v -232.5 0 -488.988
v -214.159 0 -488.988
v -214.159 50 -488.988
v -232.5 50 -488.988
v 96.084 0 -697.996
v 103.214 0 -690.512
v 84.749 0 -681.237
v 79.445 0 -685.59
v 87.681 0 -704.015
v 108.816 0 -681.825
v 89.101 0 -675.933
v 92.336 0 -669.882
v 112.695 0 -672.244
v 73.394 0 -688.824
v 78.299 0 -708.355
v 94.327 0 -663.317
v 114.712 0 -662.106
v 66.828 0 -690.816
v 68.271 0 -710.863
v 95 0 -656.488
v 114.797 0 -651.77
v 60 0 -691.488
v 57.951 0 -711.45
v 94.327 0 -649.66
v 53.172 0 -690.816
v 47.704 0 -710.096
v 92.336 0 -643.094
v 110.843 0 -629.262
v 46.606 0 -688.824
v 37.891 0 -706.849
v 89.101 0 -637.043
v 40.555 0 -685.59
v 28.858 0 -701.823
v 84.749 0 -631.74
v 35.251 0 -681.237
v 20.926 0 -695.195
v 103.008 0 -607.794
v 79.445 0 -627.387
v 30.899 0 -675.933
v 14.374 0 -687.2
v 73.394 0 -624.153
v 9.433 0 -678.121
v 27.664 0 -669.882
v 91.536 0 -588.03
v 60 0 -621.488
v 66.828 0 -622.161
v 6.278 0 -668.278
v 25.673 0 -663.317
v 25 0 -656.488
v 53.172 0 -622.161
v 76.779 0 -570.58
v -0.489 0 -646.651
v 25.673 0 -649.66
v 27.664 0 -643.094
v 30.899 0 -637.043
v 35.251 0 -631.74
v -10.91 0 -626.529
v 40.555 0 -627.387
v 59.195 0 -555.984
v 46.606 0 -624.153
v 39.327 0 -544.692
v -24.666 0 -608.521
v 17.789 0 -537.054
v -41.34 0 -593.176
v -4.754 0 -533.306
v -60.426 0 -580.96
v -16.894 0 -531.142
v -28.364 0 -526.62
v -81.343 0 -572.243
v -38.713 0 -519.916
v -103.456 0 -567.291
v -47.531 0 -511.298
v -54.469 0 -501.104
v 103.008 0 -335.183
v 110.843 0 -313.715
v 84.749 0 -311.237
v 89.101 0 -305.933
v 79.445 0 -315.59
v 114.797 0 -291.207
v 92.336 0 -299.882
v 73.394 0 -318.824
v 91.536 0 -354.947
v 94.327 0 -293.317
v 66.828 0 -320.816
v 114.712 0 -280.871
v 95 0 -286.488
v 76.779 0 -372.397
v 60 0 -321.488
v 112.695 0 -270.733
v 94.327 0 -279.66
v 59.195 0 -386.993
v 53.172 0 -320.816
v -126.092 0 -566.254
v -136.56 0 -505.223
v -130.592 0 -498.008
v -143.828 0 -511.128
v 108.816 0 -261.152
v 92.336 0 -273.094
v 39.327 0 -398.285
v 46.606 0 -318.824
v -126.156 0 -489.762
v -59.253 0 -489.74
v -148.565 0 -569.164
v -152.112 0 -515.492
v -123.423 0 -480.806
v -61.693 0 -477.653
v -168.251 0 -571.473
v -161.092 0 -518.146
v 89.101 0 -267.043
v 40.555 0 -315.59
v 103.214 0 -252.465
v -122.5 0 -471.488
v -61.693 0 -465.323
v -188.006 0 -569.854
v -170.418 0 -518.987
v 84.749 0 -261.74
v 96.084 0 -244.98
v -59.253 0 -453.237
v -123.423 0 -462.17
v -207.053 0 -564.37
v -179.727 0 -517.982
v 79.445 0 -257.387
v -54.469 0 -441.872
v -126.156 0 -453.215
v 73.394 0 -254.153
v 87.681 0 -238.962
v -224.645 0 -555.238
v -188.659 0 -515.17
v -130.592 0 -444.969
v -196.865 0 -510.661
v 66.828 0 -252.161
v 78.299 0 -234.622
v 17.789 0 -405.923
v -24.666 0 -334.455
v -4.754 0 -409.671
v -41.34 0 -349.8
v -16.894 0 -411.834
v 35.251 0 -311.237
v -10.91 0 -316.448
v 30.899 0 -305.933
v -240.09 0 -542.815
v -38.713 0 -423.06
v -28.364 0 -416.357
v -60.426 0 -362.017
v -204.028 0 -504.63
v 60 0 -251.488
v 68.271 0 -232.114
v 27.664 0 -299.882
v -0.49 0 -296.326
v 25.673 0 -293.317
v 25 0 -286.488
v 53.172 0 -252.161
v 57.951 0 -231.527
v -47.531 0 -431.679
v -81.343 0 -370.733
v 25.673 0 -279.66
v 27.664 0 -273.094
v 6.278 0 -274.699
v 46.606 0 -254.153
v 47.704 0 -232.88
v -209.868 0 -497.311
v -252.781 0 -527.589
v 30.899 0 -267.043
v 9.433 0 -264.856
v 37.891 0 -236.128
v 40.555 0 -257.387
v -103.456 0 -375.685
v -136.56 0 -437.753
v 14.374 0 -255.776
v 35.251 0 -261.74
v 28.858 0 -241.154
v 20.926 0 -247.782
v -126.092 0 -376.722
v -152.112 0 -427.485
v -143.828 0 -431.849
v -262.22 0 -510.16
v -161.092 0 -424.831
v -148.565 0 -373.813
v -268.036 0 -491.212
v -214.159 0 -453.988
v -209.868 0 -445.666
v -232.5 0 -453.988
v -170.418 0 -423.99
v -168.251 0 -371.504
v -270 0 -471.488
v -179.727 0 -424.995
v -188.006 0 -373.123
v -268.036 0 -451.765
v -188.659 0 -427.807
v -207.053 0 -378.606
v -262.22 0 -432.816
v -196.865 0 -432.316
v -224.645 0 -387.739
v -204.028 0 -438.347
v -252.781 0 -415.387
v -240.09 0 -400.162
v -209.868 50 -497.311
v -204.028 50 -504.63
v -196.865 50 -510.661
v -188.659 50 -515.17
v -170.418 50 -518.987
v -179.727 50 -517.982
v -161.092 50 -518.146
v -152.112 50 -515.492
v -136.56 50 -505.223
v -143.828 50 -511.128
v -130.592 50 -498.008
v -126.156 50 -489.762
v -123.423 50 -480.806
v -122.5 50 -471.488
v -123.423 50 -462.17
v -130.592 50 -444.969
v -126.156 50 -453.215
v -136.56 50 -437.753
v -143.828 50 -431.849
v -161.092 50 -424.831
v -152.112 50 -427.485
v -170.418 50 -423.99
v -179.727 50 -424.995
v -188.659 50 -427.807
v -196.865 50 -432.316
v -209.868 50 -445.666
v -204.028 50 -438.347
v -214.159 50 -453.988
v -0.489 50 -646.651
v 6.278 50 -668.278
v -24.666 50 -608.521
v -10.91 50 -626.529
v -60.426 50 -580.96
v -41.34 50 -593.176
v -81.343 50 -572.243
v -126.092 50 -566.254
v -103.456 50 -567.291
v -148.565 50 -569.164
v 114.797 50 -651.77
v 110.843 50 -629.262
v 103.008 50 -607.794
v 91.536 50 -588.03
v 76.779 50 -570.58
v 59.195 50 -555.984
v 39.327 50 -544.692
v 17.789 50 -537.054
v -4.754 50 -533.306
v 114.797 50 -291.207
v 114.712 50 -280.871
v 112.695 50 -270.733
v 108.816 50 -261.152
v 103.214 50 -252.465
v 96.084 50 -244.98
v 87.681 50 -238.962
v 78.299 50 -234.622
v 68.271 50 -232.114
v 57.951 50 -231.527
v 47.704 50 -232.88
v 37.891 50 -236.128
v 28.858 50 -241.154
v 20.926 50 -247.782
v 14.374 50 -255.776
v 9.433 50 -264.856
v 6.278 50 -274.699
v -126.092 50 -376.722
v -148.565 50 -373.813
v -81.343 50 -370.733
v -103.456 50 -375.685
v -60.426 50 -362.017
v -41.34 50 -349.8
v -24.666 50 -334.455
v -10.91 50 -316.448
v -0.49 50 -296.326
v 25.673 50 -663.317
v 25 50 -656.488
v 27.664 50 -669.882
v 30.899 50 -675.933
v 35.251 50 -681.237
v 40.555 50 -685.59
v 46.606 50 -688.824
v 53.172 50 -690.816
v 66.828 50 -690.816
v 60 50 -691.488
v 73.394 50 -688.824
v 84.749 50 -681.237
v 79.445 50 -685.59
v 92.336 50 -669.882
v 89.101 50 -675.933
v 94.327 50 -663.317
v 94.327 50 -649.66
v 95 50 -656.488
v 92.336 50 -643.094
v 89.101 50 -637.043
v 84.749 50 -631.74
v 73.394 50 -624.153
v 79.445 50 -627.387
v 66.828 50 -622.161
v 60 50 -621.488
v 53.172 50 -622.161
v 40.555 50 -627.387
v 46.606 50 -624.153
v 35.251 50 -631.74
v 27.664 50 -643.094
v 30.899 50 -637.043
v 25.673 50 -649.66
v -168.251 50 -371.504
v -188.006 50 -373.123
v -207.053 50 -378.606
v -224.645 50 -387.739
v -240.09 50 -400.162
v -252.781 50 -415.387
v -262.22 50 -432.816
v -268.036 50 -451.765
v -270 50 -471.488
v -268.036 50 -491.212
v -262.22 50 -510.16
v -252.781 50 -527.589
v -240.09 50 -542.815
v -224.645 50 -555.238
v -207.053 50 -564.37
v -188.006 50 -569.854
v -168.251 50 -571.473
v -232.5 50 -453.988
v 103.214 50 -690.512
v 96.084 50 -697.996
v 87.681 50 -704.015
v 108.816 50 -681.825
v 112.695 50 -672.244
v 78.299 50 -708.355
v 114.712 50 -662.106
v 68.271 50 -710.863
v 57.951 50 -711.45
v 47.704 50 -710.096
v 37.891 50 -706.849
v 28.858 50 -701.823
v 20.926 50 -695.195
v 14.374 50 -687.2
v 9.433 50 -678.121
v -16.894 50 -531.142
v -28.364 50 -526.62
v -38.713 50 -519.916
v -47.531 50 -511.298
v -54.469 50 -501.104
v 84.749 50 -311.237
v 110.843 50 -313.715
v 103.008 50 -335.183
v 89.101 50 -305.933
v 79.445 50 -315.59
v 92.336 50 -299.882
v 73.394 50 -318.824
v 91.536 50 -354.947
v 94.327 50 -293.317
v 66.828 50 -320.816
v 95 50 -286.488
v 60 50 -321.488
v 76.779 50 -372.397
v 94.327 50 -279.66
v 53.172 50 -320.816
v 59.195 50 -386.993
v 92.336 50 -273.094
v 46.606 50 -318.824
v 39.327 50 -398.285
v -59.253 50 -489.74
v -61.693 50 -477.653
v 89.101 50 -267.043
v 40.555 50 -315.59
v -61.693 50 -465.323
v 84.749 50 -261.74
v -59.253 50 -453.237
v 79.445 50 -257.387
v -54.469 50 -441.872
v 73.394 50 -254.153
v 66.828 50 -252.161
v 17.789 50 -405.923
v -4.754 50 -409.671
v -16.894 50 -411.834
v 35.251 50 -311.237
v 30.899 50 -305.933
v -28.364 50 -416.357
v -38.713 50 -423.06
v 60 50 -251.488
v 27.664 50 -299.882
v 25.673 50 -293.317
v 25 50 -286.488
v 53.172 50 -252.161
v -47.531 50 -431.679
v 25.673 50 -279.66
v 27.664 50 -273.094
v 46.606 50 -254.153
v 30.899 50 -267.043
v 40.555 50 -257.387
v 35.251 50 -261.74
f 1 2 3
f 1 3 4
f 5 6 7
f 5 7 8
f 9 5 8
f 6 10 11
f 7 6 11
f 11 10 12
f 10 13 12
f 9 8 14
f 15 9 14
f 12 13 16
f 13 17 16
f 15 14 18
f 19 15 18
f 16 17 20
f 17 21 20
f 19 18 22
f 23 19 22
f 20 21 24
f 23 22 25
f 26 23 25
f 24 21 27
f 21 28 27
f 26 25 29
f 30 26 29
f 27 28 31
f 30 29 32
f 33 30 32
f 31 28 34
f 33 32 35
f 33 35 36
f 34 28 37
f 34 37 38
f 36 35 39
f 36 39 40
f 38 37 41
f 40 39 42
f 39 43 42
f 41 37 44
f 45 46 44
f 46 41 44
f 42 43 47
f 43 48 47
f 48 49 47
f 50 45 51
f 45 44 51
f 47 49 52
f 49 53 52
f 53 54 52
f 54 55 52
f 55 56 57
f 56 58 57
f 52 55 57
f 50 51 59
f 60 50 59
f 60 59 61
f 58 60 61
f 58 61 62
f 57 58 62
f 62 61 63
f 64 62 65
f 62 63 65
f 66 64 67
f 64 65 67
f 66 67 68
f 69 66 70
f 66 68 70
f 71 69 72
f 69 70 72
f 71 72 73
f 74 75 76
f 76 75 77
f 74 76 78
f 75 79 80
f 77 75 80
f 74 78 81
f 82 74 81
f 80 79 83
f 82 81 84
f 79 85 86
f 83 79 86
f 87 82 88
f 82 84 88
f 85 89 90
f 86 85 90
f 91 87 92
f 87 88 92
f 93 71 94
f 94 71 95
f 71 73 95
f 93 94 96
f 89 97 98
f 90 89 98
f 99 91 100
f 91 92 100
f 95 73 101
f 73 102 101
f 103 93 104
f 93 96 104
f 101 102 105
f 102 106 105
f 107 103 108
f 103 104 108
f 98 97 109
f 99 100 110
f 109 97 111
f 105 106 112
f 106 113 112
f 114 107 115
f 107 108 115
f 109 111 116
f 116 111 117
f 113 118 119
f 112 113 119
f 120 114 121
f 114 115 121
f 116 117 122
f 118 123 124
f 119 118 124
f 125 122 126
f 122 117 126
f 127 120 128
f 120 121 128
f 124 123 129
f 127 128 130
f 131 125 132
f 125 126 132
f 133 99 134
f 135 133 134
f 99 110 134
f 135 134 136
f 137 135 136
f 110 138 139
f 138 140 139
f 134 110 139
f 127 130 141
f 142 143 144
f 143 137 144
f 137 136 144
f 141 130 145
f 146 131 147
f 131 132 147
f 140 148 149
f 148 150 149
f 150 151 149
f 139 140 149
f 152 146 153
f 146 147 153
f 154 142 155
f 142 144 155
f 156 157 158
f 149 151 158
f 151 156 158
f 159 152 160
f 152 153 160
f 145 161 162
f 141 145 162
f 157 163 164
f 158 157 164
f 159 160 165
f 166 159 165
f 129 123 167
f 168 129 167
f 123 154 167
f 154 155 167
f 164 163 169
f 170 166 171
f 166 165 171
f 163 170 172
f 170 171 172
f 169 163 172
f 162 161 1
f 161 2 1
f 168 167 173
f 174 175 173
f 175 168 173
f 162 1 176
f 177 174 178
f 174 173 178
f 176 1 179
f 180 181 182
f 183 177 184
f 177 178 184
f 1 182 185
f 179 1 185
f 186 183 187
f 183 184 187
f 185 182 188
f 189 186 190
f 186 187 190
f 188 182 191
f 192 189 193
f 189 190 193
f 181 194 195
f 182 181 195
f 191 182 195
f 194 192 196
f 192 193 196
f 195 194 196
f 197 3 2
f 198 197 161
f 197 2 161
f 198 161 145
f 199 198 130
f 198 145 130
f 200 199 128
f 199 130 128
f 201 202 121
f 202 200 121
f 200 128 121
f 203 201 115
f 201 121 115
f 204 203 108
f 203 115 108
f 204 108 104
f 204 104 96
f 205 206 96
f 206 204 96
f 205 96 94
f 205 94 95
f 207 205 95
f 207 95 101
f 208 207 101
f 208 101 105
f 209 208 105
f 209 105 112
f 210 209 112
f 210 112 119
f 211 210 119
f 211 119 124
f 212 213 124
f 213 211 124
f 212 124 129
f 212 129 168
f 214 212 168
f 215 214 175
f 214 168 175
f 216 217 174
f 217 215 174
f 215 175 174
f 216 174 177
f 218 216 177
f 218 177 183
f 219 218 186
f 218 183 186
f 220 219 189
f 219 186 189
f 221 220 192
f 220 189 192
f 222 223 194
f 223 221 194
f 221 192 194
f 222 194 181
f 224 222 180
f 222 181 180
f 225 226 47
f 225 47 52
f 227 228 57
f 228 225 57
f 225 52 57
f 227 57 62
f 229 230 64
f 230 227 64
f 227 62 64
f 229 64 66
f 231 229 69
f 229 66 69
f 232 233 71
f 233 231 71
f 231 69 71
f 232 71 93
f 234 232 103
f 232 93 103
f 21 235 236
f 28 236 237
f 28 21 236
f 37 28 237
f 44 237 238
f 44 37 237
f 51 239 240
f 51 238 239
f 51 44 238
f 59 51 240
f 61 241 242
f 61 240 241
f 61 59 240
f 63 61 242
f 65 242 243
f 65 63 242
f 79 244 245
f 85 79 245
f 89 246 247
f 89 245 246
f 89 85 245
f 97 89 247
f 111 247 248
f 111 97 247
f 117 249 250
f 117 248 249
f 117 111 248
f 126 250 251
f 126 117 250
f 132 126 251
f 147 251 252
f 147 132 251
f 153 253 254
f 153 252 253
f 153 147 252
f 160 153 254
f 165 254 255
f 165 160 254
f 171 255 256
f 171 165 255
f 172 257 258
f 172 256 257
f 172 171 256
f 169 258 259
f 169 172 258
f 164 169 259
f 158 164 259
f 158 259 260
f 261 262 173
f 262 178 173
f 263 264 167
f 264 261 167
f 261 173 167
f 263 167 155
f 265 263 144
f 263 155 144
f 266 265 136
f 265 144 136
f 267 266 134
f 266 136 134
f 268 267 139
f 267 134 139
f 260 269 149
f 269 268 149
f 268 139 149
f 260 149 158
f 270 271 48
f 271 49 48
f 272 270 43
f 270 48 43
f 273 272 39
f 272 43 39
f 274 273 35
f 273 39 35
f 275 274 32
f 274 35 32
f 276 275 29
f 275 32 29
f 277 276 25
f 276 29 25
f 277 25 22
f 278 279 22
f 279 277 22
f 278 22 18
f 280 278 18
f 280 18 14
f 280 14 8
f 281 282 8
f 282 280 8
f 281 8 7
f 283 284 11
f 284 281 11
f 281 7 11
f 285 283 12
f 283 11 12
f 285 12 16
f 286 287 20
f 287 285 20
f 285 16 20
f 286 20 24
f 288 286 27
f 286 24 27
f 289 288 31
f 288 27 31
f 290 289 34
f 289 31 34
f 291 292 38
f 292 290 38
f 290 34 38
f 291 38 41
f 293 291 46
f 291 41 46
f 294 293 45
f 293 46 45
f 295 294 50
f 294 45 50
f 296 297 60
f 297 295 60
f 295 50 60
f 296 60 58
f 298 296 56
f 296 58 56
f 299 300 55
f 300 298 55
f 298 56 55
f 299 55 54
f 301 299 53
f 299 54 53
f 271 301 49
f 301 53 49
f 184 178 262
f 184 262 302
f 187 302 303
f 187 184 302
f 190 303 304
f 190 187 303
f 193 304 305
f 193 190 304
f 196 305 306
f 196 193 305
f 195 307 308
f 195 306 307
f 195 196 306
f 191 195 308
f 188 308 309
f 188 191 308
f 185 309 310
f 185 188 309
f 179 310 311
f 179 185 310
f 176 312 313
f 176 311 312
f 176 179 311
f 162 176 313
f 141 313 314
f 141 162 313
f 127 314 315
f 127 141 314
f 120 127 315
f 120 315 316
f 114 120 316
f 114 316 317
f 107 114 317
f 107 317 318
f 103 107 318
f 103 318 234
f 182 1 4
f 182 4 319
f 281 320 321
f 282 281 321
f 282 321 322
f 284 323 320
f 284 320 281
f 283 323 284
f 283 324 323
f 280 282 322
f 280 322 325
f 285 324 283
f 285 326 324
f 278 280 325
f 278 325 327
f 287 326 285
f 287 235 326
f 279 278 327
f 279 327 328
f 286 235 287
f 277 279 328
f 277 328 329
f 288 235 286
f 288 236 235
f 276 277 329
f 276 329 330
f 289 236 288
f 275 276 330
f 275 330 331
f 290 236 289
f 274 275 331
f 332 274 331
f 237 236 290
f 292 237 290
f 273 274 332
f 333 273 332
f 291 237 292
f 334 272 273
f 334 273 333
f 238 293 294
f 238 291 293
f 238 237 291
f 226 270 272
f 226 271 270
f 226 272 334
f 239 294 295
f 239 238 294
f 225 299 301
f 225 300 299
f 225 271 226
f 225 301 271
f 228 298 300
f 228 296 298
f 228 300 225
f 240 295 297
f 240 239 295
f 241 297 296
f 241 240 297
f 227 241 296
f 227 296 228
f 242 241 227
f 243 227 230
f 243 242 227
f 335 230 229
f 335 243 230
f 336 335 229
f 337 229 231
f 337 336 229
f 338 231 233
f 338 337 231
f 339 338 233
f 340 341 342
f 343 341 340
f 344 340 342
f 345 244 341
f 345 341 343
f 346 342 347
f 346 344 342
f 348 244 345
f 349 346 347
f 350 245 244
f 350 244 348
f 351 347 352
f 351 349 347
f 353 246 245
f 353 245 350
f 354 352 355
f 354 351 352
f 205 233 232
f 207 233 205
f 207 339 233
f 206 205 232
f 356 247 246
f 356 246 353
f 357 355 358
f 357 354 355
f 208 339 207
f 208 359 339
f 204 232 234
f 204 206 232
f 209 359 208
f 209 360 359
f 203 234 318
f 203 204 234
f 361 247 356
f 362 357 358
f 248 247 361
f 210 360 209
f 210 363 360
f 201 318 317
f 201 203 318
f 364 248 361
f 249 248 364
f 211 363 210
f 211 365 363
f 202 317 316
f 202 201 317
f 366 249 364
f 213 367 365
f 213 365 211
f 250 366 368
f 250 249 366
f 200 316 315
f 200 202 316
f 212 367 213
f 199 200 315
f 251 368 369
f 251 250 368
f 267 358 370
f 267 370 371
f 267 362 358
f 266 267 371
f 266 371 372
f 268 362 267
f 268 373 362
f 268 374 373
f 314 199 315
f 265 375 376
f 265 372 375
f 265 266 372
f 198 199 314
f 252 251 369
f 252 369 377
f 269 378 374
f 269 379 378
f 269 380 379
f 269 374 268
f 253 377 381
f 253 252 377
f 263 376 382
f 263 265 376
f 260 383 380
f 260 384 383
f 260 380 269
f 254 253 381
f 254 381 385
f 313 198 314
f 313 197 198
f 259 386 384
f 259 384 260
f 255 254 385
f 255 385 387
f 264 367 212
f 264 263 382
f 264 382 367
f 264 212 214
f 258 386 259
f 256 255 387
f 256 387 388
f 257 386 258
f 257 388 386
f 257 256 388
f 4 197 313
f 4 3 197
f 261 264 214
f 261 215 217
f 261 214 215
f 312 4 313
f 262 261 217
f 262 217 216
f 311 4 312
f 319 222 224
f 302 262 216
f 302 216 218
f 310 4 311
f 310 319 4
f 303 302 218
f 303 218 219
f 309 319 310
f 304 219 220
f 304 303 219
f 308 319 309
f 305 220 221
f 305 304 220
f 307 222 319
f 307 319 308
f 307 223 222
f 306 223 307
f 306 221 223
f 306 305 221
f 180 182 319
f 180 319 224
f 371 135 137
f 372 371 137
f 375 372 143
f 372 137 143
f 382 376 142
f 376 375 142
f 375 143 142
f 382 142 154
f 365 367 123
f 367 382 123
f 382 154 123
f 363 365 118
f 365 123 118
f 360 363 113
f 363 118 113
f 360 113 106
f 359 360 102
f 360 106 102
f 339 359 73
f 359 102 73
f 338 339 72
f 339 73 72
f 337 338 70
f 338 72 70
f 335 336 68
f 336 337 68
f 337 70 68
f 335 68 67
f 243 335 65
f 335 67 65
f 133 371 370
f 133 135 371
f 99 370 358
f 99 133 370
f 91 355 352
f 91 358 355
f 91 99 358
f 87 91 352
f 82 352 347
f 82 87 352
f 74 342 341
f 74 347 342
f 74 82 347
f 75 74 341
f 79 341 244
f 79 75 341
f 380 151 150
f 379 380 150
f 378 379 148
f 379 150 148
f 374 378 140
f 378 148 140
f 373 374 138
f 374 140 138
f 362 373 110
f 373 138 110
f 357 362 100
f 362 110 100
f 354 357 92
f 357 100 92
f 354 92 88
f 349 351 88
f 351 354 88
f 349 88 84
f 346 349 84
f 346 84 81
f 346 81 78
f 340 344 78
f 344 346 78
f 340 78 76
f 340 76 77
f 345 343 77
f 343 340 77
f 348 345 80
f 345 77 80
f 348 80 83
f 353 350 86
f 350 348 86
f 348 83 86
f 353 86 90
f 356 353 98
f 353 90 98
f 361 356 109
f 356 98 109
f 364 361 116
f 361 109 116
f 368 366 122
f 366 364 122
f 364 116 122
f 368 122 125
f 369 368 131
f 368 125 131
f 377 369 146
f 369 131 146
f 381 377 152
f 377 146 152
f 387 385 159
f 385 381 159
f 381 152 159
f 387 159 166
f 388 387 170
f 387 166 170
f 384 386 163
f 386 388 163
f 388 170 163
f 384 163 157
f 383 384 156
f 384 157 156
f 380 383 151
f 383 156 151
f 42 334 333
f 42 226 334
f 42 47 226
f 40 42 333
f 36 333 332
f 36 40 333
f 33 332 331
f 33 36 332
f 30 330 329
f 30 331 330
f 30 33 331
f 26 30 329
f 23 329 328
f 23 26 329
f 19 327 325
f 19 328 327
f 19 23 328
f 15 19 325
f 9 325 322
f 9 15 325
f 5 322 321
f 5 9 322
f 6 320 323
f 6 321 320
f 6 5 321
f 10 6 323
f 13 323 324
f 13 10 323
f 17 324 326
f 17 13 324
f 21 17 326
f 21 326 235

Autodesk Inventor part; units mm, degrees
ref_plane "YZ Plane" through (0, 0, 0) normal (1, 0, 0) x (0, 1, 0)
ref_plane "XZ Plane" through (0, 0, 0) normal (0, 1, 0) x (-1, 0, 0)
ref_plane "XY Plane" through (0, 0, 0) normal (0, 0, 1) x (1, 0, 0)
sketch "Sketch1" plane through (0, 0, 0) normal (0, 1, 0) x (-1, 0, 0)
  arc A0 (148.5653, -569.1641) -> (148.5653, -373.8126) centre (170, -471.4884) ccw
  arc A1 (4.7545, -533.3058) -> (4.7545, -409.6709) centre (0, -471.4884) ccw
  arc A2 (-6.2783, -274.6993) -> (-114.7972, -291.2071) centre (-60, -286.4884) ccw
  arc A3 (-114.7972, -651.7696) -> (-6.2783, -668.2775) centre (-60, -656.4884) ccw
  arc A4 (-6.2783, -274.6993) -> (148.5653, -373.8126) centre (120.7001, -246.8341) ccw
  arc A5 (148.5653, -569.1641) -> (-6.2783, -668.2775) centre (120.7001, -696.1426) ccw
  arc A6 (-114.7972, -291.2071) -> (4.7545, -409.6709) centre (14.7235, -280.0537) ccw
  arc A7 (4.7545, -533.3058) -> (-114.7972, -651.7696) centre (14.7235, -662.923) ccw
  circle A8 centre (-60, -286.4884) radius 35
  arc A9 (214.1588, -453.9884) -> (214.1588, -488.9884) centre (170, -471.4884) ccw
  circle A10 centre (-60, -656.4884) radius 35
  line L0 (232.5, -453.9884) -> (214.1588, -453.9884)
  line L1 (214.1588, -488.9884) -> (232.5, -488.9884)
  line L2 (232.5, -488.9884) -> (232.5, -453.9884)
  point P0 (0, 0)
  dimension "d0" = 200
  dimension "d1" = 124
  dimension "d2" = 170
  dimension "d3" = 110
  dimension "d4" = 110
  dimension "d5" = 370
  dimension "d6" = 185
  dimension "d7" = 260
  dimension "d8" = 230
  dimension "d9" = 0
  dimension "d10" = 260
  dimension "d11" = 0
  dimension "d12" = 260
  dimension "d13" = 260
  dimension "d14" = 70
  dimension "d15" = 70
  dimension "d16" = 95
  dimension "d17" = 35
  dimension "d18" = 17.5
  dimension "d19" = 62.5
extrude "Extrusion1" add sketch "Sketch1" along normal blind 50
equation "\"d4\" = d3"
equation "\"d6\" = 0.5 * d5"
equation "\"d10\" = d7"
equation "\"d18\" = 0.5 * d17"
